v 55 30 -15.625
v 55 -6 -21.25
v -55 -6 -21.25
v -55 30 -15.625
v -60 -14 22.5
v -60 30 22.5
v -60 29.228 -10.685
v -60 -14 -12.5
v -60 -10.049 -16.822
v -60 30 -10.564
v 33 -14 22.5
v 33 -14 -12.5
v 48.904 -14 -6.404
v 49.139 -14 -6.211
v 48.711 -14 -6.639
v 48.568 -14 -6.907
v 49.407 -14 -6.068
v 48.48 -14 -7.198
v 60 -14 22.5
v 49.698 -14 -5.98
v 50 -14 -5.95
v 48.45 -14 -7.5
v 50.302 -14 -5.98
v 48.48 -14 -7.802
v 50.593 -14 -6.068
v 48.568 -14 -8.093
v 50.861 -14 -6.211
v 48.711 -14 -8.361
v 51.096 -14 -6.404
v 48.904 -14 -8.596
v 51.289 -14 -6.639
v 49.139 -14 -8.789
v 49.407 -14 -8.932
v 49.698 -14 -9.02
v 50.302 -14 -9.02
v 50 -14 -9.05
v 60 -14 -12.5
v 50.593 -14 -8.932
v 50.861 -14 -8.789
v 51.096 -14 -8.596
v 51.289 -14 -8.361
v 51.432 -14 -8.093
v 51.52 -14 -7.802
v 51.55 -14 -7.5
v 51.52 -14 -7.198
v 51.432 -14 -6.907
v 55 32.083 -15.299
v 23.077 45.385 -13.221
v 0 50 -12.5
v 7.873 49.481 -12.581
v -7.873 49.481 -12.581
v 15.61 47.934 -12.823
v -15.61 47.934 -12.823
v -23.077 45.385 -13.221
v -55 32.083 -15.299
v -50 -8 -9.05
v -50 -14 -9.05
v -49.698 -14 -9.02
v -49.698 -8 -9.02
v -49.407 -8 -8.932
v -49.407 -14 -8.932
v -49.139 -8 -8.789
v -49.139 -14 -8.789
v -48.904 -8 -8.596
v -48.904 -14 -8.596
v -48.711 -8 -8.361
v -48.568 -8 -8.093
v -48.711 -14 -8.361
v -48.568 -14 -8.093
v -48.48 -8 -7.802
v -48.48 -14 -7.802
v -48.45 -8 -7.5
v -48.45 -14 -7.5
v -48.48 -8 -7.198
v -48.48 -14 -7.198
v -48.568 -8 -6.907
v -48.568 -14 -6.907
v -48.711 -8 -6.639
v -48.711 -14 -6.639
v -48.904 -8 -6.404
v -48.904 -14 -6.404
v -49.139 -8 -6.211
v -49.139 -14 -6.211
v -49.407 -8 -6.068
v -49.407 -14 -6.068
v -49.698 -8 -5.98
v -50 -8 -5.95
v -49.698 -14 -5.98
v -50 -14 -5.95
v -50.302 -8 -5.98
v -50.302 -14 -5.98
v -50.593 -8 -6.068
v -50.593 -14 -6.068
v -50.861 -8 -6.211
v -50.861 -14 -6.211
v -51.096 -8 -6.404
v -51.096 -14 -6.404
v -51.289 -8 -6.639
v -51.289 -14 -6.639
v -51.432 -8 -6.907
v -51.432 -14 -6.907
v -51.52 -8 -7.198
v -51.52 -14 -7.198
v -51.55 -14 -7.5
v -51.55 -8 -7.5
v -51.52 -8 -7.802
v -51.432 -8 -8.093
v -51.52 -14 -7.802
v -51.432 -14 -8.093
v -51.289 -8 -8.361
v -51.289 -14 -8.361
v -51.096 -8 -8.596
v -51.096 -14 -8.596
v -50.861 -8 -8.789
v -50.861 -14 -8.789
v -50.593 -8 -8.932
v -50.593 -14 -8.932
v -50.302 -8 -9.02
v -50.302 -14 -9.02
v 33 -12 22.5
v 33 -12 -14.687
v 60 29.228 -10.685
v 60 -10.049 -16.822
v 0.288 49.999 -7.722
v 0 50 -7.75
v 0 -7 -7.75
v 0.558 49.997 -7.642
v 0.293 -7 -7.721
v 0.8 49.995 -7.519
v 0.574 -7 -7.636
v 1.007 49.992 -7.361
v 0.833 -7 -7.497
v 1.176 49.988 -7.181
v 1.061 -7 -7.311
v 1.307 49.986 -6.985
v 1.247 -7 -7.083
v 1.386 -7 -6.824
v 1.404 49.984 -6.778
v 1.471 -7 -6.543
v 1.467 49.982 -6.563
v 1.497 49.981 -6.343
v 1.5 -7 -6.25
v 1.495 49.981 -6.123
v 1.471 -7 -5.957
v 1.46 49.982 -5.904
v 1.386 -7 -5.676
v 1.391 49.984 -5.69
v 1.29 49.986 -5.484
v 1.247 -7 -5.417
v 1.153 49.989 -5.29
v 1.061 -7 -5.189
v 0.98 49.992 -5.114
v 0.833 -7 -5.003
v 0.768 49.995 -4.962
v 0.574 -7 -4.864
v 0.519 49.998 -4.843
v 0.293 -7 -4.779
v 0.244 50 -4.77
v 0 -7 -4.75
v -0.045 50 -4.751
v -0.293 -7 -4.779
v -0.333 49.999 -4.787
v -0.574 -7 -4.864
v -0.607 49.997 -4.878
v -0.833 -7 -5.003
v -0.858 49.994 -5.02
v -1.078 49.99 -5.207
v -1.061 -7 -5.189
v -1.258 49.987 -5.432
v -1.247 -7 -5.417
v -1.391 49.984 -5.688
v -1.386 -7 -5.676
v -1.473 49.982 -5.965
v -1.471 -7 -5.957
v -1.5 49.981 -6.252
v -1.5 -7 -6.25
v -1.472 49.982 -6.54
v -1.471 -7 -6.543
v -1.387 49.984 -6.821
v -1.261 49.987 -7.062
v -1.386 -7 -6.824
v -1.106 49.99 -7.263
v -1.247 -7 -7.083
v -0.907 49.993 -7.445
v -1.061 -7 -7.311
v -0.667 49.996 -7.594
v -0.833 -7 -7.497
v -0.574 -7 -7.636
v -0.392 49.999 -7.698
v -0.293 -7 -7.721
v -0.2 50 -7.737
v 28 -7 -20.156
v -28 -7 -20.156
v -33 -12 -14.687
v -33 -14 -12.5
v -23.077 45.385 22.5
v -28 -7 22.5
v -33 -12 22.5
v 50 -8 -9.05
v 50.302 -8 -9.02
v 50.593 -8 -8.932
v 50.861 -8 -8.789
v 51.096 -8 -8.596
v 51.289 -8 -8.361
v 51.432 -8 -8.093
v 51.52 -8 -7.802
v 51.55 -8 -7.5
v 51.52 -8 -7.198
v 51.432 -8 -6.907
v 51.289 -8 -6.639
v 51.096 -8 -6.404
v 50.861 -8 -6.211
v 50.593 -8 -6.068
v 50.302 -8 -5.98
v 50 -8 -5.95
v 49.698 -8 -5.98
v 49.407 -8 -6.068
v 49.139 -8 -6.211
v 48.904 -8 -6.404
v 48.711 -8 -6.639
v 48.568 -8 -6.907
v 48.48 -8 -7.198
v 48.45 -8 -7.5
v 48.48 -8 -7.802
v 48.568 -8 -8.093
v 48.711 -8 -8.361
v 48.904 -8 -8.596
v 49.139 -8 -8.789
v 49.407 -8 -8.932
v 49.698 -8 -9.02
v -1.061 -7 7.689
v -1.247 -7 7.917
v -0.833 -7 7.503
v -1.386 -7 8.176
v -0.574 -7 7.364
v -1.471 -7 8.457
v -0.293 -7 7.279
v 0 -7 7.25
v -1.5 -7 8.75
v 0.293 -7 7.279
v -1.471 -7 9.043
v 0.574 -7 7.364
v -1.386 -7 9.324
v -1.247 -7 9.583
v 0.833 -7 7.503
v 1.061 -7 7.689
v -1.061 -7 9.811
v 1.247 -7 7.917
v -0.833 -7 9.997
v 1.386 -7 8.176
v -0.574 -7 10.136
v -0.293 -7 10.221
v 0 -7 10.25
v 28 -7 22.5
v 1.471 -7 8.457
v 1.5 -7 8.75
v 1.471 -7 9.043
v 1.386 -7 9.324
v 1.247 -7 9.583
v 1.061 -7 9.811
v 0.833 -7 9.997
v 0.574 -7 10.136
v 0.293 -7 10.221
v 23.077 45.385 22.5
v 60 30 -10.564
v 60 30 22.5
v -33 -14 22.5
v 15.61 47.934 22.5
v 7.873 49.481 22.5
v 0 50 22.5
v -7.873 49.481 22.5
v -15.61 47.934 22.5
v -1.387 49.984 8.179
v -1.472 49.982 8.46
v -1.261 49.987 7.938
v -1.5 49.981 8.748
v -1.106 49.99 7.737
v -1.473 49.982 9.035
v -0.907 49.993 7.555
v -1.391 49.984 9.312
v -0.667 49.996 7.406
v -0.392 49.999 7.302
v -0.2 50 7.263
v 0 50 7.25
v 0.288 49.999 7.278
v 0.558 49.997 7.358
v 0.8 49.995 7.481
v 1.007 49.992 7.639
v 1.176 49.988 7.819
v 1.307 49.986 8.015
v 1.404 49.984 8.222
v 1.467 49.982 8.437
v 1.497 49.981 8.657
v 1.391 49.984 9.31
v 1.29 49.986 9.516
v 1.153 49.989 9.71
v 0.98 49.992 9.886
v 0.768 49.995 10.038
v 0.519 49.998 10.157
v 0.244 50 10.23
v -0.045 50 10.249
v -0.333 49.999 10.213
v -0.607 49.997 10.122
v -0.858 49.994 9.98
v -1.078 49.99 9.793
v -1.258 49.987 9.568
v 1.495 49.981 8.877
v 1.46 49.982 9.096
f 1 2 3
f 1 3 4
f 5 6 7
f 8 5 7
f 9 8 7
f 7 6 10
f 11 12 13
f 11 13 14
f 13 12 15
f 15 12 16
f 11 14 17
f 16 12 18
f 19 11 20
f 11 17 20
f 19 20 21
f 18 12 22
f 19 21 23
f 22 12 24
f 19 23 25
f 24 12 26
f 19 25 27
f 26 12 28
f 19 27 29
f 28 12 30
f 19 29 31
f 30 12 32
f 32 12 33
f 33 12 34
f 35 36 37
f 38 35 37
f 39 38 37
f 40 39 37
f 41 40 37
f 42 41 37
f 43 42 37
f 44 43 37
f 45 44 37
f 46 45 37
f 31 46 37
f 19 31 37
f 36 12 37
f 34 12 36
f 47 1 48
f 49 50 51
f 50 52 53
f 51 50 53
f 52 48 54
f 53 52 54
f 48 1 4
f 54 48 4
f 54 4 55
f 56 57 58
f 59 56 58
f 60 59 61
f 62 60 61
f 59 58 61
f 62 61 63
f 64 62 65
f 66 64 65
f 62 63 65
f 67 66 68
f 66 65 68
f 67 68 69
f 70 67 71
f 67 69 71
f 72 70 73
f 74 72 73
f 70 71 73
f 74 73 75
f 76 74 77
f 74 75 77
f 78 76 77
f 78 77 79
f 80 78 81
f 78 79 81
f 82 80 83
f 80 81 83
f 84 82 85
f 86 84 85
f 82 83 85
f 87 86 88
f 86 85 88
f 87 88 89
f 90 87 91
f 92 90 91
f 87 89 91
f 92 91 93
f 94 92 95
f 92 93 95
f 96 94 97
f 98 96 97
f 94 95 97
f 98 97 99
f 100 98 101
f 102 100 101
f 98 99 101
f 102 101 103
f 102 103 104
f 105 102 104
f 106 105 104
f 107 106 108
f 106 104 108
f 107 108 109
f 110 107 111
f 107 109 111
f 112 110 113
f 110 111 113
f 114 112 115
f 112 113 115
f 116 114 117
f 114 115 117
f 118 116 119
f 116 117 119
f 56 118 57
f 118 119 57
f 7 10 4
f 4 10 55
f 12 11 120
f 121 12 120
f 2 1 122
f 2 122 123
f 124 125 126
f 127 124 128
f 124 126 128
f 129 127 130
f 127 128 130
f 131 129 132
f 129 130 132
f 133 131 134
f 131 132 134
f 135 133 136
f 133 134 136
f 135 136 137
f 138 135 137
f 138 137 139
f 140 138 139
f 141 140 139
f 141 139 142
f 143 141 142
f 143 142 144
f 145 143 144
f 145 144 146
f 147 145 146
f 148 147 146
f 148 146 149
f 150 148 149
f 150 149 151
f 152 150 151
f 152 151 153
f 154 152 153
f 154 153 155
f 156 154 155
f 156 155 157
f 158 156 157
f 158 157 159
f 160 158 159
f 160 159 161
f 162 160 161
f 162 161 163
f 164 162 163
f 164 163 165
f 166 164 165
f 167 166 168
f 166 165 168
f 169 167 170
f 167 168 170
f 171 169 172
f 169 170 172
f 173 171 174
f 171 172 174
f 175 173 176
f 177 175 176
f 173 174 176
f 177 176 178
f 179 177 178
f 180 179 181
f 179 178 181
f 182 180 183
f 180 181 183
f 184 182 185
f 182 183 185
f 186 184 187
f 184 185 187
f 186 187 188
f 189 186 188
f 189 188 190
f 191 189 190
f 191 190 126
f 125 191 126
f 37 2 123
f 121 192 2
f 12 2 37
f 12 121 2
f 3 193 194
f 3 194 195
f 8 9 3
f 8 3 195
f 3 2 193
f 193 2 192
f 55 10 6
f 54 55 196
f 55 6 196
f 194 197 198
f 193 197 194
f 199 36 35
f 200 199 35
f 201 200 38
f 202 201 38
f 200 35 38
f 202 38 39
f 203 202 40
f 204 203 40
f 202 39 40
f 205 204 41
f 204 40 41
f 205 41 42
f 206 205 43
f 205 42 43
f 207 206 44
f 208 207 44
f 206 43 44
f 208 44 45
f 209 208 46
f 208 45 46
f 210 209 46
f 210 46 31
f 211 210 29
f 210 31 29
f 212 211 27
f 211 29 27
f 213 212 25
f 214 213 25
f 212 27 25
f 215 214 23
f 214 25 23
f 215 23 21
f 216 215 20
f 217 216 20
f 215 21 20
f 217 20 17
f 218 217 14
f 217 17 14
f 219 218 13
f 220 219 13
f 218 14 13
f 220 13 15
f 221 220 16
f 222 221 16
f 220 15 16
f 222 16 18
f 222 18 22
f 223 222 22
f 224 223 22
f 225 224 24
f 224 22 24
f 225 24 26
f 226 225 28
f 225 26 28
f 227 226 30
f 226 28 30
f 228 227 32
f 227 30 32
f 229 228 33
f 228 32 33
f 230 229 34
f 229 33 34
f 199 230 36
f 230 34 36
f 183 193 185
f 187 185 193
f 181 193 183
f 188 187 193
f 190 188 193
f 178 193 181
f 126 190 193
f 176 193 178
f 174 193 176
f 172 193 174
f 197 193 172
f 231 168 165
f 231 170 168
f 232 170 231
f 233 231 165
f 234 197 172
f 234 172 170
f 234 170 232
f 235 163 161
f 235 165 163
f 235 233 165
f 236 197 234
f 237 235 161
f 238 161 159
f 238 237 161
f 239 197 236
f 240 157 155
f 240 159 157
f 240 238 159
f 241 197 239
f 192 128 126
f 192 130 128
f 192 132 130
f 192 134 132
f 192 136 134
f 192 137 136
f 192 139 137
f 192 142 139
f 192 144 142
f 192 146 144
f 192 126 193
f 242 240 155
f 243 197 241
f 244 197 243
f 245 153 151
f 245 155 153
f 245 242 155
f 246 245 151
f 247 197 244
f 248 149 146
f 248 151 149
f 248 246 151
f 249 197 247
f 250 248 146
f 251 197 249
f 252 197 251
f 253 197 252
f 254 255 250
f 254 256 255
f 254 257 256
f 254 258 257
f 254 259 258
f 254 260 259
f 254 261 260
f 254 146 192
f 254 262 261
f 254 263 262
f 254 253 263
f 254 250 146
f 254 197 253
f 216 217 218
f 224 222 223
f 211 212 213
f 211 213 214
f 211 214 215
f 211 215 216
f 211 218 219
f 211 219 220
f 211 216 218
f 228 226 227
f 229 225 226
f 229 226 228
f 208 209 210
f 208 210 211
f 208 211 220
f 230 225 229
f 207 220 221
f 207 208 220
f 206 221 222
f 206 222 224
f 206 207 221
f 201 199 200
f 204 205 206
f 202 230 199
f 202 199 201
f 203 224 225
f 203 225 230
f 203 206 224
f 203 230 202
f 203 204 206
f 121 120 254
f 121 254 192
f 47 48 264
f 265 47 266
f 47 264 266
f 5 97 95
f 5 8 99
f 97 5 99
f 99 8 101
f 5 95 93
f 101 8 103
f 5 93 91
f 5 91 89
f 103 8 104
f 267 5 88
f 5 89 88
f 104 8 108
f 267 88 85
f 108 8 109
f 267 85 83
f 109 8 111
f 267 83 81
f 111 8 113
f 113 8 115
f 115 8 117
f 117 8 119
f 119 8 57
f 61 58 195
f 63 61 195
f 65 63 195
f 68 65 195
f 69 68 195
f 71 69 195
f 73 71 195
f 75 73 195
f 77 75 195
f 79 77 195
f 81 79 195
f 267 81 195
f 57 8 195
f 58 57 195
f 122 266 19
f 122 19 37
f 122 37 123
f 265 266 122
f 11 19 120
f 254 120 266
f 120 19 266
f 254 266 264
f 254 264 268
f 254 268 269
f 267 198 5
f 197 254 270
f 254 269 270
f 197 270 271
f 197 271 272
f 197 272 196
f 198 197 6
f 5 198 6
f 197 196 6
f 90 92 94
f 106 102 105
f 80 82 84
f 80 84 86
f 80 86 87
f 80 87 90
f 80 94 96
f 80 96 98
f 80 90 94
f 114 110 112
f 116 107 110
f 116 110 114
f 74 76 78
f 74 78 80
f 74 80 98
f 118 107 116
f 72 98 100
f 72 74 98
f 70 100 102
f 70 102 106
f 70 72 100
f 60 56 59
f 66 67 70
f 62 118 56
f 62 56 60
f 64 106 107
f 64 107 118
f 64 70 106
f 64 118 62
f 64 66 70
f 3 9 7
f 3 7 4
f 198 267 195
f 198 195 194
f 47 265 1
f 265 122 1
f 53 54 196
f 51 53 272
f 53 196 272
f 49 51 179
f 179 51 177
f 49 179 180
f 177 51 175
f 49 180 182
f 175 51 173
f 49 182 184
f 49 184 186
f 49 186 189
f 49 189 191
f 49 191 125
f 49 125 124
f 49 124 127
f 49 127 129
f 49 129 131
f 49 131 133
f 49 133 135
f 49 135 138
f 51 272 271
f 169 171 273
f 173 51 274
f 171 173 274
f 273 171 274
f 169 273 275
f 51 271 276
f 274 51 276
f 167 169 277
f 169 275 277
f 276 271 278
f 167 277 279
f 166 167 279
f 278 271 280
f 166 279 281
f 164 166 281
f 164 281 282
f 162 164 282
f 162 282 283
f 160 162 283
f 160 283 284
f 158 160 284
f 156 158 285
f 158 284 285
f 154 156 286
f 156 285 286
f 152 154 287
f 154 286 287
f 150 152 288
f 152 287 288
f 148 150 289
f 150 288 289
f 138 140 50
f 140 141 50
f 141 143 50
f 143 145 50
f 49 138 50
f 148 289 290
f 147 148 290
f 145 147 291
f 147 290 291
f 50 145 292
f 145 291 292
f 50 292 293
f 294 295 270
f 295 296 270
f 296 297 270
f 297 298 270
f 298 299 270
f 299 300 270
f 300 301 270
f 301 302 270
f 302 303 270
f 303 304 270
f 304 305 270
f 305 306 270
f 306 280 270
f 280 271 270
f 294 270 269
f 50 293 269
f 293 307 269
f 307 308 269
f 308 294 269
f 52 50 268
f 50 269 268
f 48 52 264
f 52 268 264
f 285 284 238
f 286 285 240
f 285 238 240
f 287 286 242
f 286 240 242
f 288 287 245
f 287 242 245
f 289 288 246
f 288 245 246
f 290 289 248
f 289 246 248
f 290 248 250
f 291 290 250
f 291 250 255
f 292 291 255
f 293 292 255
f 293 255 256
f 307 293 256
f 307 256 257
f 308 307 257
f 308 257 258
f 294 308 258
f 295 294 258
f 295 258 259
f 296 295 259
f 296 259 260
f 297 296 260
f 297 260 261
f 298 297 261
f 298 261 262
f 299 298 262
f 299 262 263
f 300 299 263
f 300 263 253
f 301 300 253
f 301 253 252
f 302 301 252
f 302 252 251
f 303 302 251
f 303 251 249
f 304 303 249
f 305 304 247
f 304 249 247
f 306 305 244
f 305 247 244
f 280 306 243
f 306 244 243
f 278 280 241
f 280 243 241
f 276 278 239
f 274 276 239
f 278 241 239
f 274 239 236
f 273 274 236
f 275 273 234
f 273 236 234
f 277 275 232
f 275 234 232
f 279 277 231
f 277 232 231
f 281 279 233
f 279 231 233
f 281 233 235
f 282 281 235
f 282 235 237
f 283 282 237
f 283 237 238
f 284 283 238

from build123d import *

# Parameters (mm, degrees)
CROQUIS1_W              = 120
CROQUIS1_H              = 45
CROQUIS1_R              = 1.55
SALIENTE_EXTRUIR1_DEPTH = 30
CROQUIS2_W              = 120
CROQUIS2_H              = 45
SALIENTE_EXTRUIR2_DEPTH = 44
SALIENTE_EXTRUIR5_DEPTH = 45
CROQUIS6_R              = 1.55
CORTAR_EXTRUIR2_DEPTH   = 6
CORTAR_EXTRUIR3_DEPTH   = 132.932747906
CHAFL_N1_SIZE           = 5
CROQUIS9_W              = 66
CROQUIS9_H              = 7
CORTAR_EXTRUIR4_DEPTH   = 91.138781721
CHAFL_N2_SIZE           = 5
CORTAR_EXTRUIR6_DEPTH   = 132.932747906
CROQUIS11_R             = 1.5
CORTAR_EXTRUIR7_DEPTH   = 86.762753955


with BuildPart() as part:
    # Croquis1 → Saliente-Extruir1 (new body)
    with BuildSketch(Plane(origin=(0, 0, 0), x_dir=(1, 0, 0), z_dir=(0, 1, 0))):
        Rectangle(CROQUIS1_W, CROQUIS1_H)
        with Locations(Location((-50, -7.5, 0), (0, 0, 270))):
            Circle(CROQUIS1_R, mode=Mode.SUBTRACT)
        with Locations(Location((50, -7.5, 0), (0, 0, 270))):
            Circle(CROQUIS1_R, mode=Mode.SUBTRACT)
    extrude(amount=SALIENTE_EXTRUIR1_DEPTH)

    # Croquis2 → Saliente-Extruir2 (add)
    with BuildSketch(Plane(origin=(0, 30, 0), x_dir=(1, 0, 0), z_dir=(0, 1, 0))):
        Rectangle(CROQUIS2_W, CROQUIS2_H)
    extrude(amount=-SALIENTE_EXTRUIR2_DEPTH)

    # Croquis5 → Saliente-Extruir5 (add, through all)
    with BuildSketch(Plane.XY.offset(22.5)):
        with BuildLine():
            Line((-60, 30), (-23.076922962, 45.384615109))
            ThreePointArc((-23.076922962, 45.384615109), (0, 49.999999701), (23.076922962, 45.384615109))
            Line((23.076922962, 45.384615109), (60, 30))
            Line((60, 30), (-60, 30))
        make_face()
    extrude(amount=-SALIENTE_EXTRUIR5_DEPTH)

    # Croquis6 → Cortar-Extruir2 (cut)
    with BuildSketch(Plane.XZ.offset(14)):
        with Locations(Location((-50, -7.5, 0), (0, 0, 270))):
            Circle(CROQUIS6_R)
        with Locations(Location((50, -7.5, 0), (0, 0, 270))):
            Circle(CROQUIS6_R)
    extrude(amount=-CORTAR_EXTRUIR2_DEPTH, mode=Mode.SUBTRACT)

    # Croquis8 → Cortar-Extruir3 (cut, through all)
    with BuildSketch(Plane.ZY.offset(60)):
        Polygon((-22.5, 30), (-15.624999968, 30), (-12.5, 49.999999701), (-22.5, 49.999999701), align=None)
        Polygon((-22.5, 30), (-22.5, -14), (-15.624999968, 30), align=None)
    extrude(amount=-CORTAR_EXTRUIR3_DEPTH, mode=Mode.SUBTRACT)

    # Chaflán1
    chafl_n1_edges = [part.edges().sort_by_distance(p)[0] for p in [
        (60, 8, -19.062499984),
        (-60, 8, -19.062499984),
    ]]
    chamfer(chafl_n1_edges, length=CHAFL_N1_SIZE)

    # Croquis9 → Cortar-Extruir4 (cut, through all)
    with BuildSketch(Plane.XY.offset(22.5)):
        with Locations((0, -10.5)):
            Rectangle(CROQUIS9_W, CROQUIS9_H)
    extrude(amount=-CORTAR_EXTRUIR4_DEPTH, mode=Mode.SUBTRACT)

    # Chaflán2
    chafl_n2_edges = [part.edges().sort_by_distance(p)[0] for p in [
        (-33, -7, 0.546875003),
        (33, -7, 0.546875003),
    ]]
    chamfer(chafl_n2_edges, length=CHAFL_N2_SIZE)

    # Croquis10 → Cortar-Extruir6 (cut, through all)
    with BuildSketch(Plane.ZY.offset(60)):
        Polygon((-21.249999994, -6), (-12.5, -14), (-22.5, -14), align=None)
    extrude(amount=-CORTAR_EXTRUIR6_DEPTH, mode=Mode.SUBTRACT)

    # Croquis11 → Cortar-Extruir7 (cut, through all)
    with BuildSketch(Plane.XZ.offset(7)):
        with Locations(Location((0, -6.249999994, 0), (0, 0, 270))):
            Circle(CROQUIS11_R)
        with Locations(Location((0, 8.750000006, 0), (0, 0, 270))):
            Circle(CROQUIS11_R)
    extrude(amount=-CORTAR_EXTRUIR7_DEPTH, mode=Mode.SUBTRACT)


solid = part.part
